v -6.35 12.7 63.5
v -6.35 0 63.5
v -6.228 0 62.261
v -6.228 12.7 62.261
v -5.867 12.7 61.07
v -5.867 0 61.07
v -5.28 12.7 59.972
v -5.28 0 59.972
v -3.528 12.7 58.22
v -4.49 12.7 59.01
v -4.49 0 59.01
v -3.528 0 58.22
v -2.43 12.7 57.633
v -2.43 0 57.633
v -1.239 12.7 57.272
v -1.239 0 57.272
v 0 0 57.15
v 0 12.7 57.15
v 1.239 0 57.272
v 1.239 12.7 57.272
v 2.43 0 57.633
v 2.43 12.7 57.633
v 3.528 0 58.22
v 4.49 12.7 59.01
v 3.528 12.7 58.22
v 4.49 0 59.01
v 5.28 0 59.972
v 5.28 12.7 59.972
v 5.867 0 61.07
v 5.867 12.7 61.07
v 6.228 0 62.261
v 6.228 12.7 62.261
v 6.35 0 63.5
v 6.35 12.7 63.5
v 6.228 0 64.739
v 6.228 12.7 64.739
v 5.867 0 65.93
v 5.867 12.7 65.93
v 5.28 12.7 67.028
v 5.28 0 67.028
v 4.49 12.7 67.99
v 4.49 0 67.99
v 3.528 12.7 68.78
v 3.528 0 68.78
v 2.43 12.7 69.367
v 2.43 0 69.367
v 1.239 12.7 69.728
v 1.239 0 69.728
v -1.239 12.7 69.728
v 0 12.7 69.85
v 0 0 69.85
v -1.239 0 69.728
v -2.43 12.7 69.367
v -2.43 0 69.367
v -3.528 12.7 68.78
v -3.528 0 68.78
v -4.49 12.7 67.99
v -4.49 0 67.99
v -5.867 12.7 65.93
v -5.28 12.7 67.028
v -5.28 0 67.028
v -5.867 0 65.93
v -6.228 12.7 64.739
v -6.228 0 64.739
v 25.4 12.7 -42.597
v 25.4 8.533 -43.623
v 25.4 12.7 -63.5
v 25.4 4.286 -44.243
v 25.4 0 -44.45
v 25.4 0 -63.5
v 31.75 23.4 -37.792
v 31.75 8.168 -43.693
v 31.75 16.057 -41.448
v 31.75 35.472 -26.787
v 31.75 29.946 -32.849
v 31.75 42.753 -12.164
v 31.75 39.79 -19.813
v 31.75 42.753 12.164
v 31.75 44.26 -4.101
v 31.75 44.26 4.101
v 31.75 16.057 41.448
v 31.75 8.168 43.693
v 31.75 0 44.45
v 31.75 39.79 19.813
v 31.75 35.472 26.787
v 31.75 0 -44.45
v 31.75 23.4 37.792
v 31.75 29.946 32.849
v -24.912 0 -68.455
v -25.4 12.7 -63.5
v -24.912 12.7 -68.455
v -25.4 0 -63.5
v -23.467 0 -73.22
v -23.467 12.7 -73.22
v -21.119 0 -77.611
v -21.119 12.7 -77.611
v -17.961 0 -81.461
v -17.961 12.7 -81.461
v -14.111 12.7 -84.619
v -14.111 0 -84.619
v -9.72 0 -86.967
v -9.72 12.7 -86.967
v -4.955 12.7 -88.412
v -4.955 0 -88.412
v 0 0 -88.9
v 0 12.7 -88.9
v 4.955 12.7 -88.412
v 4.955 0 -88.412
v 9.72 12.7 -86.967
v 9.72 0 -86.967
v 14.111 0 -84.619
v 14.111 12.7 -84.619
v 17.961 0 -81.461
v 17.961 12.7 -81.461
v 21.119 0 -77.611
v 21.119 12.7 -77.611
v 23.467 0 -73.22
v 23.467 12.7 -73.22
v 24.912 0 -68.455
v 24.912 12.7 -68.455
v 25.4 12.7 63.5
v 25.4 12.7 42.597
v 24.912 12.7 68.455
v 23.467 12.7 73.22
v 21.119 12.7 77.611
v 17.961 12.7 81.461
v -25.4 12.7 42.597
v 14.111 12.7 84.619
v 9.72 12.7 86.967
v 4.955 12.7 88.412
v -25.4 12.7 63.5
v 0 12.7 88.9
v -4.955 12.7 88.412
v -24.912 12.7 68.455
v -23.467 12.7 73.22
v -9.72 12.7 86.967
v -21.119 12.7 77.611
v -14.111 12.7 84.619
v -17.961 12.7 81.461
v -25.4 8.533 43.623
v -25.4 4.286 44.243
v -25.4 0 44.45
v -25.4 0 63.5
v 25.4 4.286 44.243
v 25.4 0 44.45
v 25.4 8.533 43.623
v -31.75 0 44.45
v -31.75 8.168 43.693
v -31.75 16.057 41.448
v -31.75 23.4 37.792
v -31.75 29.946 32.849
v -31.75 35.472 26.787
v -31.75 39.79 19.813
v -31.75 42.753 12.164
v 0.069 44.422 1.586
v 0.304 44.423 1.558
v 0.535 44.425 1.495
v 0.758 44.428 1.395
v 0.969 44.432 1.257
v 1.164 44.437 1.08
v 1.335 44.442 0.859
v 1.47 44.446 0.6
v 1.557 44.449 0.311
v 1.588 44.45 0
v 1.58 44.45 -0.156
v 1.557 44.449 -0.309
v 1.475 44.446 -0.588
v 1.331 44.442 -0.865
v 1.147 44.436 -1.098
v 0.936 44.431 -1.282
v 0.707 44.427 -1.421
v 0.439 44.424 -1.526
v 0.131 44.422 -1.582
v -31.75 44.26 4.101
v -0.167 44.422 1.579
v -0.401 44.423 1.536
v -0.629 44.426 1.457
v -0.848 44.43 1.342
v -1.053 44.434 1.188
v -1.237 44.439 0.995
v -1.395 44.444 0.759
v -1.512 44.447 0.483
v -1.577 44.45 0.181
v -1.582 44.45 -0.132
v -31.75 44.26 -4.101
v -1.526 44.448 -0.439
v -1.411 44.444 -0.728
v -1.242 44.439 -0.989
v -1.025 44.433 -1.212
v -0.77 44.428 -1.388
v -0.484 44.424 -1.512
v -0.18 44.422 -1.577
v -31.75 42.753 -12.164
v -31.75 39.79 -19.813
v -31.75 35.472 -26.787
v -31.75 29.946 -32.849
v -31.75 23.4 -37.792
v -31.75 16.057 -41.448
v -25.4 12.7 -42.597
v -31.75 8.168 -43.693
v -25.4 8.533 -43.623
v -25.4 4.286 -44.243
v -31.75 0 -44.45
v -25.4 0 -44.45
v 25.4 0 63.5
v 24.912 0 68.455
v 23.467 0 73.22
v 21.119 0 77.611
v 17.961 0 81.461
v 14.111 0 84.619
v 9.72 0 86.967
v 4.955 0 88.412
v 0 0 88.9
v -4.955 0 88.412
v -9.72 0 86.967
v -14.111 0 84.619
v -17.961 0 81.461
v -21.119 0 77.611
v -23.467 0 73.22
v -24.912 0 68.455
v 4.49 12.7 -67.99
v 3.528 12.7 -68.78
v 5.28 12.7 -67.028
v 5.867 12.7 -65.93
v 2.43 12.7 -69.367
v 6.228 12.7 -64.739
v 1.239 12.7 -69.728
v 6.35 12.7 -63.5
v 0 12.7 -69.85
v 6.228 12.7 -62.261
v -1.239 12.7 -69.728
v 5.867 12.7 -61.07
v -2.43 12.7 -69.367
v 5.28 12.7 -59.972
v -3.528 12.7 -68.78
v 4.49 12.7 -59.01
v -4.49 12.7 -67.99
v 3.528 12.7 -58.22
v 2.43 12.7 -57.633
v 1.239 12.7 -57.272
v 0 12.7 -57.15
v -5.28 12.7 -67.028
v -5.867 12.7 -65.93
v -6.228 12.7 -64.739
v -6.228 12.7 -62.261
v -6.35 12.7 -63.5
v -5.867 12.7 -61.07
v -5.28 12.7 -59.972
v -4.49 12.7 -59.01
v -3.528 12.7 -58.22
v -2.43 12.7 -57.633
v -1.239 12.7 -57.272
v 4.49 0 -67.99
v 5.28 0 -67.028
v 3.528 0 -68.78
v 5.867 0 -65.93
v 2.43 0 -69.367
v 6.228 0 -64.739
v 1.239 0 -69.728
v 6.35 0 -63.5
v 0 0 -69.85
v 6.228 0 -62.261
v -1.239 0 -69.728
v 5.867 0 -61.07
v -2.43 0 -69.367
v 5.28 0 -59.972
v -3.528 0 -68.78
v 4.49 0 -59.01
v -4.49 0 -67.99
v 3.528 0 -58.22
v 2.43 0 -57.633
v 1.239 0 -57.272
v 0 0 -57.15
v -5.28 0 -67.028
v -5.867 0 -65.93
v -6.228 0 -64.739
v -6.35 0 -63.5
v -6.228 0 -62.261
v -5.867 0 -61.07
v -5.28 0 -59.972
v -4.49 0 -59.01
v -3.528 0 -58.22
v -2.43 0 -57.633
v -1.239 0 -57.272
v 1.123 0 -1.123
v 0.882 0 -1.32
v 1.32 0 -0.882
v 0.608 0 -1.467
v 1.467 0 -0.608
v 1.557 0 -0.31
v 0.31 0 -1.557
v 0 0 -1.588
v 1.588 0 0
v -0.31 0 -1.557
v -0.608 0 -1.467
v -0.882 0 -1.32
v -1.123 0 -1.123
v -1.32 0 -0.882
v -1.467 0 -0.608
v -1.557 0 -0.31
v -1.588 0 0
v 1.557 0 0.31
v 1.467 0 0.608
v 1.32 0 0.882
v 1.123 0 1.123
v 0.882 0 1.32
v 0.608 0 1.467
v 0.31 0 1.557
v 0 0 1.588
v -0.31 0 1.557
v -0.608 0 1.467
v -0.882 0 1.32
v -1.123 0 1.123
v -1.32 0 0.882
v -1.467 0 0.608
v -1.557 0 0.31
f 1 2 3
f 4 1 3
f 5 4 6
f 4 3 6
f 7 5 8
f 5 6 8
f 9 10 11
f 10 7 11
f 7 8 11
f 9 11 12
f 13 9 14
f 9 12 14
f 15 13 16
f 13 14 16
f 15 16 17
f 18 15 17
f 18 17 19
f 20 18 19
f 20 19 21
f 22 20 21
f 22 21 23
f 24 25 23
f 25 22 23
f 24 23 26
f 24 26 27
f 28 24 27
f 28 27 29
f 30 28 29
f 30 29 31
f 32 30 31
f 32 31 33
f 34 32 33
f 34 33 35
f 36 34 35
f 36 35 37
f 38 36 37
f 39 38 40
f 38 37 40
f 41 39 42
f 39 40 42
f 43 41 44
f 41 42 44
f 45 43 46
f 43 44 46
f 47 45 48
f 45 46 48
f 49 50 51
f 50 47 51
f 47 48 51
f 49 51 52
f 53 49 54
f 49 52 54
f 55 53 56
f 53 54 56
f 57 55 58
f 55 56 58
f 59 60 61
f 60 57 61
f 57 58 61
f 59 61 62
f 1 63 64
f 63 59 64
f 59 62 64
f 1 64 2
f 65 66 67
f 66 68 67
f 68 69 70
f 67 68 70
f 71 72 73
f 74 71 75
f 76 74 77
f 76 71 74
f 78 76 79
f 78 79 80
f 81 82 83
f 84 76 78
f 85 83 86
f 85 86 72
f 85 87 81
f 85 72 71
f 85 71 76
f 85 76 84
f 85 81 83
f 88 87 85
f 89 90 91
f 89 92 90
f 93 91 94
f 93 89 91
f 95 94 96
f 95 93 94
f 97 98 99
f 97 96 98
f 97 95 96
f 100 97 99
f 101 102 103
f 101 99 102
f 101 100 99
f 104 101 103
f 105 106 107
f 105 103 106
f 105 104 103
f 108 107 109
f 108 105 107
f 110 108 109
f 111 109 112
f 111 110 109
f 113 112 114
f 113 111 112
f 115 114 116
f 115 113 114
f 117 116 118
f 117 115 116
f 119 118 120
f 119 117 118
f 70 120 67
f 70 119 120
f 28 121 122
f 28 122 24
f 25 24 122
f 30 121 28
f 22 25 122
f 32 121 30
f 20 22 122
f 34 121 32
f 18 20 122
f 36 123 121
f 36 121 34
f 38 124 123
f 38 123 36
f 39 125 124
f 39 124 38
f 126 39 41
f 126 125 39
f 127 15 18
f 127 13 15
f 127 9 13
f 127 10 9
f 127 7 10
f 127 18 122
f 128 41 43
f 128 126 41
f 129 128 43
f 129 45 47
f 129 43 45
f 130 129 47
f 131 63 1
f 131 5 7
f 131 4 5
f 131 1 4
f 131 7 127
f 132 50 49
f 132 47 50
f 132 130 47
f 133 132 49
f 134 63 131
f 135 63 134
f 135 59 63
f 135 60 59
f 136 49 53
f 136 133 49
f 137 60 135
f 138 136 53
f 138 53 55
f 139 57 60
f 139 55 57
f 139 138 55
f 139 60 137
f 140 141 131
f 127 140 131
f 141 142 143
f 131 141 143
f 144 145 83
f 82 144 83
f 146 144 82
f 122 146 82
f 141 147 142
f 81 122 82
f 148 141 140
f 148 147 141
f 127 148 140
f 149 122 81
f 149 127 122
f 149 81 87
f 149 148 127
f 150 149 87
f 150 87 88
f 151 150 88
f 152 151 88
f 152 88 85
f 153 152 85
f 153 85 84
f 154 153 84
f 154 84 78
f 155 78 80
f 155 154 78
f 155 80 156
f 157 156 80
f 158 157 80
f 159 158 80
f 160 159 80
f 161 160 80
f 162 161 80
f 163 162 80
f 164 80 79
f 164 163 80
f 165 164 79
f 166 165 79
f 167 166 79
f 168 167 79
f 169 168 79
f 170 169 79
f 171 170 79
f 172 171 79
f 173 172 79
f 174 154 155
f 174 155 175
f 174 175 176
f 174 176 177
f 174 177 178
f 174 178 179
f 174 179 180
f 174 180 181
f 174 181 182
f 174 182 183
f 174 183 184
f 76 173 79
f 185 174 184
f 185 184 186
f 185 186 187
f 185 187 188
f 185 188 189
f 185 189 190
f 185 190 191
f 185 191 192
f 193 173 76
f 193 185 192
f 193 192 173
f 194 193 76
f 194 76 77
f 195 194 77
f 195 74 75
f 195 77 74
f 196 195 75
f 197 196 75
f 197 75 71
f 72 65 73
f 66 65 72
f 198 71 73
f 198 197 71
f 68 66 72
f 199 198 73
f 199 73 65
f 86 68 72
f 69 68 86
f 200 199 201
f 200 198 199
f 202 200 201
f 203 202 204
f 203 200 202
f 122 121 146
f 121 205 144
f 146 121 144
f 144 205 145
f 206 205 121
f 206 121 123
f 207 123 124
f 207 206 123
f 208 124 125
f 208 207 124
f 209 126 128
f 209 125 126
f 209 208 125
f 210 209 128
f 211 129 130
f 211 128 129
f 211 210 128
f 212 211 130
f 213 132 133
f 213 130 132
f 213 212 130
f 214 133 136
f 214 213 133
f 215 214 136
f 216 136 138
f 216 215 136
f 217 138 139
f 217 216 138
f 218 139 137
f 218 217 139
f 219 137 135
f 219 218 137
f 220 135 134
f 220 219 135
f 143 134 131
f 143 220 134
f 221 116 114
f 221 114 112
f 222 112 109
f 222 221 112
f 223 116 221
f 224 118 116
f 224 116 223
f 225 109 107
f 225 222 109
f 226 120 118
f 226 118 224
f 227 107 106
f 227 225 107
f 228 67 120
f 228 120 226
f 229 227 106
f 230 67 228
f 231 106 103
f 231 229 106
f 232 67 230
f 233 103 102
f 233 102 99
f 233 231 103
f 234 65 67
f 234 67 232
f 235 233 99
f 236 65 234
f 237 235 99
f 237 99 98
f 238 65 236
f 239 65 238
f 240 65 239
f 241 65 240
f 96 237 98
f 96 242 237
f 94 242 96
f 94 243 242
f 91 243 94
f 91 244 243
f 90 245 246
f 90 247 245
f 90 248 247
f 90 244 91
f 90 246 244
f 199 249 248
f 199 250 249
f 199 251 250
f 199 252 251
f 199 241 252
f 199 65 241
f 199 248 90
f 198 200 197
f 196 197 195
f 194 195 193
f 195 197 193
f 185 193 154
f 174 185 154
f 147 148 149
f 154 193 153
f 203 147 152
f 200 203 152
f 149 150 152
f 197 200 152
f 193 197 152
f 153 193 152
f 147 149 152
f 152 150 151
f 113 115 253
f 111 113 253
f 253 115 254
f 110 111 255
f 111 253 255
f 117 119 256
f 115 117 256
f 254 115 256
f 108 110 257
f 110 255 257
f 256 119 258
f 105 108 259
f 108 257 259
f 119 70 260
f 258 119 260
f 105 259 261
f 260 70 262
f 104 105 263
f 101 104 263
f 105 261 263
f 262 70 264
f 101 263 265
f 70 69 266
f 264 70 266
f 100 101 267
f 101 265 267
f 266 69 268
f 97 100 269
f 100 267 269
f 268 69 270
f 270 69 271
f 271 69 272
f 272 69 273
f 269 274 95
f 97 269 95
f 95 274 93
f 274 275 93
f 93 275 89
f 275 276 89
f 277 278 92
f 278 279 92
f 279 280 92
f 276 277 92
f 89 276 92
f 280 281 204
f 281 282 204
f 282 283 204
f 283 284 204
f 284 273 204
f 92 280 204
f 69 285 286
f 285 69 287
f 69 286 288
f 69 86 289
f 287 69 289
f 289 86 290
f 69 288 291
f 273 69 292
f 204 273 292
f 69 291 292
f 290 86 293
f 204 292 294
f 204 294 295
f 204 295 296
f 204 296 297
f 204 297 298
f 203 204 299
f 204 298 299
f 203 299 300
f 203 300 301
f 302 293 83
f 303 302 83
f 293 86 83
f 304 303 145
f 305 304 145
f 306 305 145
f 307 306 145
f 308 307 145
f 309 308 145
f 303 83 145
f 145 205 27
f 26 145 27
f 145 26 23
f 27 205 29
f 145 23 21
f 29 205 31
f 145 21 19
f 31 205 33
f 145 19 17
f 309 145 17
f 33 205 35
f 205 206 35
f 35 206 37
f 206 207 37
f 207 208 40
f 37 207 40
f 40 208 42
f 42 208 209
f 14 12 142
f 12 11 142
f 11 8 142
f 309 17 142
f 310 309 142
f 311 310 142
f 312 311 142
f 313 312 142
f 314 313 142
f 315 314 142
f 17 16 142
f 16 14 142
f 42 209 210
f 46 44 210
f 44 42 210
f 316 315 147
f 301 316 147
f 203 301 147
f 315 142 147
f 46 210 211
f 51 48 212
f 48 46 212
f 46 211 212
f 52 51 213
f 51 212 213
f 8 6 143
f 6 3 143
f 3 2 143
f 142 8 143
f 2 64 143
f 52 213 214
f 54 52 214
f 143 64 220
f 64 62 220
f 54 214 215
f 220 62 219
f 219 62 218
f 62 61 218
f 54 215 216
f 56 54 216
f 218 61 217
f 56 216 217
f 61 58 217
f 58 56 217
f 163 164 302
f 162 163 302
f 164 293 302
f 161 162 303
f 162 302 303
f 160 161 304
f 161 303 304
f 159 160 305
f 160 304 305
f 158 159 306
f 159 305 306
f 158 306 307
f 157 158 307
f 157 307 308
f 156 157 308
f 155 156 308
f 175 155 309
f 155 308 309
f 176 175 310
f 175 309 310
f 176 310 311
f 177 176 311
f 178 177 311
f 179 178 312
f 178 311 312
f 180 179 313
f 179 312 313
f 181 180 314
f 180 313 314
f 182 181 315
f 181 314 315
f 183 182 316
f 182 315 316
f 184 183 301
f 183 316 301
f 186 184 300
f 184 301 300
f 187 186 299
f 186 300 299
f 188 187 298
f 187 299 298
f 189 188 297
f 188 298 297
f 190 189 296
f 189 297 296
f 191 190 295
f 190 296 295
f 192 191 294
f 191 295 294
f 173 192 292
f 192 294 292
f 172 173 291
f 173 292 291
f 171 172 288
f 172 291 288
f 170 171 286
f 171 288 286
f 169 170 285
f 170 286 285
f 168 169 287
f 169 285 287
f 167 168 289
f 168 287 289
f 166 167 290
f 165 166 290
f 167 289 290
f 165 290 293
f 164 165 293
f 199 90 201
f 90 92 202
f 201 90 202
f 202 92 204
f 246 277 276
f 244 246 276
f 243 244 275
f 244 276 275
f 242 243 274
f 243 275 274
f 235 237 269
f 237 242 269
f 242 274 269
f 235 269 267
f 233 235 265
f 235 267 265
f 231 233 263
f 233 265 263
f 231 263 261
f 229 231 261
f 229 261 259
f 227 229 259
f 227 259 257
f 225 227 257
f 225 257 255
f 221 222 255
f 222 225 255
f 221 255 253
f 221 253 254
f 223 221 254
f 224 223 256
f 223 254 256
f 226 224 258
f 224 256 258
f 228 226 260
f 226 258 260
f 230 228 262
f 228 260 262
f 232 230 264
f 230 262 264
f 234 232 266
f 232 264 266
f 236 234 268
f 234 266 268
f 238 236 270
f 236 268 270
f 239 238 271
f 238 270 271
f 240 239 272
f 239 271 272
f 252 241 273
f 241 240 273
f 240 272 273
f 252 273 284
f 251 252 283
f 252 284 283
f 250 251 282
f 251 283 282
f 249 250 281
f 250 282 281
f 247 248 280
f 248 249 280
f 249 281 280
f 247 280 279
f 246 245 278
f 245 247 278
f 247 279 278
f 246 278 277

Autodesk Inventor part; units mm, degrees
ref_plane "YZ Plane" through (0, 0, 0) normal (1, 0, 0) x (0, 1, 0)
ref_plane "XZ Plane" through (0, 0, 0) normal (0, 1, 0) x (-1, 0, 0)
ref_plane "XY Plane" through (0, 0, 0) normal (0, 0, 1) x (1, 0, 0)
sketch "Sketch1" plane through (0, 0, 0) normal (0, 1, 0) x (-1, 0, 0)
  line L0 (0, 63.5) -> (0, -63.5) construction
  line L1 (-25.4, 63.5) -> (-25.4, -63.5)
  line L2 (25.4, -63.5) -> (25.4, 63.5)
  arc A0 (25.4, 63.5) -> (-25.4, 63.5) centre (0, 63.5) ccw
  arc A1 (-25.4, -63.5) -> (25.4, -63.5) centre (0, -63.5) ccw
  circle A2 centre (0, 63.5) radius 6.35
  circle A3 centre (0, -63.5) radius 6.35
  point P0 (0, 0)
  dimension "d0" = 127
  dimension "d1" = 25.4
  dimension "d2" = 12.7
extrude "Extrusion1" add sketch "Sketch1" along normal blind 12.7
sketch "Sketch2" plane through (0, 0, 0) normal (1, 0, 0) x (0, 1, 0)
  arc A0 (0, -44.45) -> (0, 44.45) centre (0, 0) ccw
  line L0 (0, 44.45) -> (0, -44.45)
  line L1 (0, 63.5) -> (0, -63.5) projected
  dimension "d5" = 44.45
extrude "Extrusion2" add sketch "Sketch2" along normal mid plane 63.5
sketch "Sketch3" plane through (31.75, 0, 0) normal (1, 0, 0) x (0, 0, -1)
  line L0 (-25.4, 0) -> (25.4, 0)
  line L1 (25.4, 0) -> (25.4, 19.05)
  line L2 (25.4, 19.05) -> (-25.4, 19.05)
  line L3 (-25.4, 19.05) -> (-25.4, 0)
  point P0 (0, 0)
  point P1 (0, 19.05)
  point P2 (0, 0)
  dimension "d8" = 50.8
  dimension "d9" = 19.05
extrude "rectCut" [suppressed]
sketch "Sketch4" plane through (31.75, 0, -25.4) normal (0, -1, 0) x (1, 0, 0)
  circle A0 centre (-31.75, 25.4) radius 1.5875
  dimension "d12" = 3.175
extrude ".125Hole" cut sketch "Sketch4" against normal through all
sketch "Sketch5" plane through (31.75, 0, 0) normal (1, 0, 0) x (0, 0, -1)
  arc A0 (31.75, 0) -> (-31.75, 0) centre (0, 0) ccw
  line L0 (31.75, 0) -> (-31.75, 0)
  dimension "d15" = 31.75
extrude "circCut" [suppressed]
properties part number "ch7-parent"
